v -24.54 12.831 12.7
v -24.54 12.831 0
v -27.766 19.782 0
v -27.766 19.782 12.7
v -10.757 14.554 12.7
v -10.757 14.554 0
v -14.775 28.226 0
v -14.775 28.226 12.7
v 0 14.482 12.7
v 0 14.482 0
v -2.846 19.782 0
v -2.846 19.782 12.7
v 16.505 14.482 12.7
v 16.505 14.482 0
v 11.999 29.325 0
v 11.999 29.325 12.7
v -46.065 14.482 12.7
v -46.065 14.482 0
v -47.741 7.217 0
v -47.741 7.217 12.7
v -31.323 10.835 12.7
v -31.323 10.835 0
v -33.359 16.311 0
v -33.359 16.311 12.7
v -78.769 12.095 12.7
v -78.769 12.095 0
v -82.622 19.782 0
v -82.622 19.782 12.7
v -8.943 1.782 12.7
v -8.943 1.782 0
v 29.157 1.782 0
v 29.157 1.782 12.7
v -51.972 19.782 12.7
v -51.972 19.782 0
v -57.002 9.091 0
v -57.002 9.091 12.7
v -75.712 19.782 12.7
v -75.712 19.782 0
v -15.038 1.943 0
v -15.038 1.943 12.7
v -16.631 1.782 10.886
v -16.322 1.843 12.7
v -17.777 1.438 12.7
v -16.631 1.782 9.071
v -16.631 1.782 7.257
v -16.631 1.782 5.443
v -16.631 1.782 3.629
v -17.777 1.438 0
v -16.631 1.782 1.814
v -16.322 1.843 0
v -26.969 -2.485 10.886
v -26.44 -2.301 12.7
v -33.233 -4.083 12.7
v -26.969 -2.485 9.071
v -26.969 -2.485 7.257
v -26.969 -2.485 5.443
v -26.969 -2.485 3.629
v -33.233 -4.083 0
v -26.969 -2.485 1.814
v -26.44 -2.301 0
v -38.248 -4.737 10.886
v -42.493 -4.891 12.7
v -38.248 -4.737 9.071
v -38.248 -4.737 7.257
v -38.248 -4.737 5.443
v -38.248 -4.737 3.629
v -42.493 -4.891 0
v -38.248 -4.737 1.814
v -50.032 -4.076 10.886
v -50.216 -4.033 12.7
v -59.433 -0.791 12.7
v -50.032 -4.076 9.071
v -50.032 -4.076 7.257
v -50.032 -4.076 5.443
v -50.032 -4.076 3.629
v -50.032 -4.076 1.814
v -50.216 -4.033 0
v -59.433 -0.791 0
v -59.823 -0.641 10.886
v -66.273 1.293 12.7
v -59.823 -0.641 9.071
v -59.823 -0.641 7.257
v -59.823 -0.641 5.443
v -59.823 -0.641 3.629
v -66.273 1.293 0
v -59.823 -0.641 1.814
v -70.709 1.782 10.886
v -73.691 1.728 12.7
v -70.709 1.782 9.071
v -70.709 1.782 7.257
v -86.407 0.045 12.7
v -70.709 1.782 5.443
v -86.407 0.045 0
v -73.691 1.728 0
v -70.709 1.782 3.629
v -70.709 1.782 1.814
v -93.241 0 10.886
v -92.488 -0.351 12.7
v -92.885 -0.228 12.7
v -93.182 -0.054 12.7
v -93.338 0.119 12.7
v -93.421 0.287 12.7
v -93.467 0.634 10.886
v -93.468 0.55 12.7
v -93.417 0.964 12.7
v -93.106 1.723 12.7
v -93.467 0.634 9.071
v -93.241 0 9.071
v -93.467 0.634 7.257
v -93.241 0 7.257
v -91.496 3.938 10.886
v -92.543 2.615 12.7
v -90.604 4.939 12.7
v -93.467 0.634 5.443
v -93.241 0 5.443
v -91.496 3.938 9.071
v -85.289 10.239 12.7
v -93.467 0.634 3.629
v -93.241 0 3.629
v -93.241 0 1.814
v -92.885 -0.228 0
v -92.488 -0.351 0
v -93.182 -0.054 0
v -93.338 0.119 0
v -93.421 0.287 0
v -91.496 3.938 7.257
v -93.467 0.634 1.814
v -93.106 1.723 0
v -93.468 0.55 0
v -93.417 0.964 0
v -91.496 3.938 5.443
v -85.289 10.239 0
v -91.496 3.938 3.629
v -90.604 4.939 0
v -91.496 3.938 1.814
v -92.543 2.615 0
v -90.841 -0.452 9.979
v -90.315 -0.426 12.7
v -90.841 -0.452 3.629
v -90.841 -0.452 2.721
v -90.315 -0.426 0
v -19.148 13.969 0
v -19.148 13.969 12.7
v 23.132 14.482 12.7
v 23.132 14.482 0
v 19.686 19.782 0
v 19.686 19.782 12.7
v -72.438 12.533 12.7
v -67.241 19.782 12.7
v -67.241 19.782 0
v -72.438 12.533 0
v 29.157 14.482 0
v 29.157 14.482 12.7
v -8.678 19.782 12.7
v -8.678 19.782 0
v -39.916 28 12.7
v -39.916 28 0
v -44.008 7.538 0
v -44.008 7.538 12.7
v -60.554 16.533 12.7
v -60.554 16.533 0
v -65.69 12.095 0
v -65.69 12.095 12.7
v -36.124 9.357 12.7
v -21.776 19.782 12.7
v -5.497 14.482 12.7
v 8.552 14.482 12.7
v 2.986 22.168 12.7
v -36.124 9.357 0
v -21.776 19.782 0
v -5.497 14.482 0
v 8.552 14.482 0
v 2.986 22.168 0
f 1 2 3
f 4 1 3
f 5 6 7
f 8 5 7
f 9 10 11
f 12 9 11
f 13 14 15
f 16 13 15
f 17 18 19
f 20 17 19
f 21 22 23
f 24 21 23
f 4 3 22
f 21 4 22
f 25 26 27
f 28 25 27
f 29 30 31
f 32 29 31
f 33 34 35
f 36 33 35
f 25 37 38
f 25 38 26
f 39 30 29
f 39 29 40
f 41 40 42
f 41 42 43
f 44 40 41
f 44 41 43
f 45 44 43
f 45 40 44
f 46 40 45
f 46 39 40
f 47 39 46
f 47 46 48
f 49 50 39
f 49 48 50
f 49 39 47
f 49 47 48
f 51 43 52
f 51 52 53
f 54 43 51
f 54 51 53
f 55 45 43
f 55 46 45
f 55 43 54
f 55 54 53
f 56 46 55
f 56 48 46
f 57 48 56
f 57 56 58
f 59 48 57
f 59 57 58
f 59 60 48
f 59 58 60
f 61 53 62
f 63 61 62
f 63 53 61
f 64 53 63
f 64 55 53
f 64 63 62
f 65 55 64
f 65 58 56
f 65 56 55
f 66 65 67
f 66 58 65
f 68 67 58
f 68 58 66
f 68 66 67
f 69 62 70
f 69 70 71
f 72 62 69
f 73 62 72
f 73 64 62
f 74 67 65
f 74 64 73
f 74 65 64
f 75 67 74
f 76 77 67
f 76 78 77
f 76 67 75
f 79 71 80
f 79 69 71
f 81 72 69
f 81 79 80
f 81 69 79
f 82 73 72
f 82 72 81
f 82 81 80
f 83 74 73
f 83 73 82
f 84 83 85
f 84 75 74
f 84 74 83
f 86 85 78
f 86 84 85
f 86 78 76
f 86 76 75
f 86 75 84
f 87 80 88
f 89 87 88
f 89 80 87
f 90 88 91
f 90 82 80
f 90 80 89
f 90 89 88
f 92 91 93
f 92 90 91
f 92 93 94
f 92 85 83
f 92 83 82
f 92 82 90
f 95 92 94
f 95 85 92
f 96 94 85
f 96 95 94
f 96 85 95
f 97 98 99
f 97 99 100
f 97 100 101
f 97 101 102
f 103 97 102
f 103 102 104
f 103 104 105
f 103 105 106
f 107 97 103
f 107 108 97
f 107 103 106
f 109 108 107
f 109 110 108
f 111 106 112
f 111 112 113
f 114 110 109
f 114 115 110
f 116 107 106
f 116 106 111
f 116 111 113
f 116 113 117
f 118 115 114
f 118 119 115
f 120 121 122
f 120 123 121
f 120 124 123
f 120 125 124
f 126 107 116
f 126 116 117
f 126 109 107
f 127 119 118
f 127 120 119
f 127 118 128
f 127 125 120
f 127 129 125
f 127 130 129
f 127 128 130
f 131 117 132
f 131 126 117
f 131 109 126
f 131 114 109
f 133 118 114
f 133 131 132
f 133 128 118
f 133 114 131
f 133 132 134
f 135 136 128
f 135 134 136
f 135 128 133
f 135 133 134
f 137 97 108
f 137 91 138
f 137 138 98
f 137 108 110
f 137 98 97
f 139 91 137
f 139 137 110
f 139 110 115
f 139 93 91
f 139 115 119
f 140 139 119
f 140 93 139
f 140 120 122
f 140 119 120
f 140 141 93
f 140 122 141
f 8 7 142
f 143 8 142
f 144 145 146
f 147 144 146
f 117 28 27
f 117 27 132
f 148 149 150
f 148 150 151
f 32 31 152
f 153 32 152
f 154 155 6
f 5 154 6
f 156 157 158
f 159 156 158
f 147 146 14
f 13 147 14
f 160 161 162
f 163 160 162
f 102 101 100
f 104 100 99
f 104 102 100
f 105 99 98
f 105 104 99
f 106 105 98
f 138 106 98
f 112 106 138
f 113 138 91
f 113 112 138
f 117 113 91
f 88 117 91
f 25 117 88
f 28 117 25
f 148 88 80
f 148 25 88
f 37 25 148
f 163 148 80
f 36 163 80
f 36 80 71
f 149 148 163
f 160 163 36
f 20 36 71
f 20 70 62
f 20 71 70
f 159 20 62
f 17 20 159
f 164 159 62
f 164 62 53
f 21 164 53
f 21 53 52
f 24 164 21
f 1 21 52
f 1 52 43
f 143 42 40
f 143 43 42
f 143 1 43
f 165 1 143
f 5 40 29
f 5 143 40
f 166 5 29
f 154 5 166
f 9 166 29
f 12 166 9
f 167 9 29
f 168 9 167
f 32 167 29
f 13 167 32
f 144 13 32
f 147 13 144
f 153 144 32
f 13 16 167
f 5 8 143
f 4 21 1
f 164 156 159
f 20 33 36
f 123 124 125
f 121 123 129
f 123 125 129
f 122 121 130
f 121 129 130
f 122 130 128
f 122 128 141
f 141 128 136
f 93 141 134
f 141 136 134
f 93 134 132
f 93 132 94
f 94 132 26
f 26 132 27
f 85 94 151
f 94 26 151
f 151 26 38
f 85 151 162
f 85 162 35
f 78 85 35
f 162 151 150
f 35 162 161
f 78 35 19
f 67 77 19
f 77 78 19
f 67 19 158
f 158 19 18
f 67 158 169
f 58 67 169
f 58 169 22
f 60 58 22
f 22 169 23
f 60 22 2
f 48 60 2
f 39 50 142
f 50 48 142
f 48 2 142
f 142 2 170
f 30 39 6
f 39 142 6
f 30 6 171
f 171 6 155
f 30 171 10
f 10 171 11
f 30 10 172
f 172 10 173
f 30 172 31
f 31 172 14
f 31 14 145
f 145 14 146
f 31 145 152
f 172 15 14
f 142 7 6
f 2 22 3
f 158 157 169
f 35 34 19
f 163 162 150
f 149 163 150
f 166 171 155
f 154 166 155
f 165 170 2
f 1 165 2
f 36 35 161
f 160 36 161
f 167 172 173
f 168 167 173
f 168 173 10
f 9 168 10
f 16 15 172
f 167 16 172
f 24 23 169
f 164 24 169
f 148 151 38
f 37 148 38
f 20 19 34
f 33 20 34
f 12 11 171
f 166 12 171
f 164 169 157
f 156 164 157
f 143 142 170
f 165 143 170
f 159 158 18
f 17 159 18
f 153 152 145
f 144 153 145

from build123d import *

# Parameters (mm, degrees)
F1_DEPTH = 12.7


# Not quite as in the source:
# - a feature names something its author has since deleted; it is built from what else it names


with BuildPart() as f1:
    # F0 (on Top) → F1 (new body)
    with BuildSketch(Plane.XY):
        with BuildLine():
            Line((29.1566601902, 1.7817904405), (29.1566601902, 14.4817904405))
            Line((29.1566601902, 14.4817904405), (23.1322348118, 14.4817904405))
            Line((23.1322348118, 14.4817904405), (16.5050514042, 14.4817904405))
            Line((16.5050514042, 14.4817904405), (8.552428335, 14.4817904405))
            Line((8.552428335, 14.4817904405), (0, 14.4817904405))
            Line((0, 14.4817904405), (-5.4972041398, 14.4817904405))
            Line((-5.4972041398, 14.4817904405), (-8.9433398098, 14.4817904405))
            add(Edge.make_bspline(
                [(-8.9433398098, 14.4817904405), (-10.7573023584, 14.5540929372), (-13.6536245903, 14.6695370673), (-17.5443018447, 14.2319983354), (-19.1478505954, 13.9692945078)],
                knots=[0, 0, 0, 0, 0.1219531365, 0.1947204372, 0.1947204372, 0.1947204372, 0.1947204372], degree=3))
            add(Edge.make_bspline(
                [(-19.1478505954, 13.9692945078), (-20.7855145388, 13.7010017066), (-22.5792086961, 13.3292483099), (-24.5403655562, 12.8306326712)],
                knots=[0.1947204372, 0.1947204372, 0.1947204372, 0.1947204372, 0.2690358483, 0.2690358483, 0.2690358483, 0.2690358483], degree=3))
            add(Edge.make_bspline(
                [(-24.5403655562, 12.8306326712), (-25.4054556528, 12.6106872606), (-27.5608275588, 12.0233152228), (-29.9097113738, 11.2820530364), (-31.3234997305, 10.8352217448)],
                knots=[0.2690358483, 0.2690358483, 0.2690358483, 0.2690358483, 0.3018172782, 0.3477460441, 0.3477460441, 0.3477460441, 0.3477460441], degree=3))
            add(Edge.make_bspline(
                [(-31.3234997305, 10.8352217448), (-32.8813721767, 10.3428523218), (-34.4916669077, 9.8331294404), (-36.1239915531, 9.3570380081)],
                knots=[0.3477460441, 0.3477460441, 0.3477460441, 0.3477460441, 0.3983555703, 0.3983555703, 0.3983555703, 0.3983555703], degree=3))
            add(Edge.make_bspline(
                [(-36.1239915531, 9.3570380081), (-38.7371673177, 8.5948669557), (-41.406802576, 7.9188884572), (-44.0082018162, 7.5382862352)],
                knots=[0.3983555703, 0.3983555703, 0.3983555703, 0.3983555703, 0.4793759651, 0.4793759651, 0.4793759651, 0.4793759651], degree=3))
            add(Edge.make_bspline(
                [(-44.0082018162, 7.5382862352), (-45.2733883847, 7.3531809228), (-46.5224347573, 7.2379423921), (-47.7409961664, 7.2166347961)],
                knots=[0.4793759651, 0.4793759651, 0.4793759651, 0.4793759651, 0.518780111, 0.518780111, 0.518780111, 0.518780111], degree=3))
            add(Edge.make_bspline(
                [(-47.7409961664, 7.2166347961), (-48.61023628, 7.2014353839), (-51.8736517816, 7.3260381182), (-54.8343256873, 8.2766625789), (-57.0016363215, 9.090849647)],
                knots=[0.518780111, 0.518780111, 0.518780111, 0.518780111, 0.5468883902, 0.6262253297, 0.6262253297, 0.6262253297, 0.6262253297], degree=3))
            add(Edge.make_bspline(
                [(-57.0016363215, 9.090849647), (-59.8222284032, 10.150452992), (-62.6109209229, 11.4001772385), (-65.6900354035, 12.0947333053)],
                knots=[0.6262253297, 0.6262253297, 0.6262253297, 0.6262253297, 0.7294764002, 0.7294764002, 0.7294764002, 0.7294764002], degree=3))
            add(Edge.make_bspline(
                [(-65.6900354035, 12.0947333053), (-67.0336130762, 12.397804214), (-69.2092078019, 12.7047556683), (-71.5833285763, 12.6062540598), (-72.4382368268, 12.5328440974)],
                knots=[0.7294764002, 0.7294764002, 0.7294764002, 0.7294764002, 0.7745302084, 0.7995461596, 0.7995461596, 0.7995461596, 0.7995461596], degree=3))
            add(Edge.make_bspline(
                [(-72.4382368268, 12.5328440974), (-78.4000977285, 12.0209061386), (-85.6590909795, 9.2956107983), (-85.3310582144, 10.1307918098), (-85.2885097265, 10.2391215041)],
                knots=[0.7995461596, 0.7995461596, 0.7995461596, 0.7995461596, 0.9739995247, 1, 1, 1, 1], degree=3))
            add(Edge.make_bspline(
                [(-8.9433398098, 1.7817904405), (-10.3062057468, 1.7346839959), (-12.9857258176, 1.6420683833), (-17.1466296289, 2.4827049446), (-27.1606442527, -4.0355858357), (-51.6393795509, -6.6773487114), (-67.5806364014, 5.6865791664), (-100.6765031612, -4.5794896544), (-89.9229154748, 5.7761967552), (-85.2885097265, 10.2391215041)],
                knots=[0, 0, 0, 0, 0.0795605261, 0.1564233287, 0.2898559981, 0.4816905838, 0.6666516763, 0.8563389789, 1, 1, 1, 1], degree=3))
            Line((-8.9433398098, 1.7817904405), (29.1566601902, 1.7817904405))
        make_face()
        with BuildLine():
            Line((-82.6221928, 19.7822675109), (-85.2885097265, 10.2391215041))
            add(Edge.make_bspline(
                [(-72.4382368268, 12.5328440974), (-78.4000977285, 12.0209061386), (-85.6590909795, 9.2956107983), (-85.3310582144, 10.1307918098), (-85.2885097265, 10.2391215041)],
                knots=[0.7995461596, 0.7995461596, 0.7995461596, 0.7995461596, 0.9739995247, 1, 1, 1, 1], degree=3))
            Line((-72.4382368268, 12.5328440974), (-75.7119506598, 19.7822675109))
            Line((-75.7119506598, 19.7822675109), (-78.7689969505, 12.0947333053))
            Line((-78.7689969505, 12.0947333053), (-82.6221928, 19.7822675109))
        make_face()
        with BuildLine():
            Line((-67.2413259745, 19.7822675109), (-72.4382368268, 12.5328440974))
            add(Edge.make_bspline(
                [(-65.6900354035, 12.0947333053), (-67.0336130762, 12.397804214), (-69.2092078019, 12.7047556683), (-71.5833285763, 12.6062540598), (-72.4382368268, 12.5328440974)],
                knots=[0.7294764002, 0.7294764002, 0.7294764002, 0.7294764002, 0.7745302084, 0.7995461596, 0.7995461596, 0.7995461596, 0.7995461596], degree=3))
            Line((-65.6900354035, 12.0947333053), (-67.2413259745, 19.7822675109))
        make_face()
        with BuildLine():
            Line((-51.9719198346, 19.7822675109), (-57.0016363215, 9.090849647))
            add(Edge.make_bspline(
                [(-47.7409961664, 7.2166347961), (-48.61023628, 7.2014353839), (-51.8736517816, 7.3260381182), (-54.8343256873, 8.2766625789), (-57.0016363215, 9.090849647)],
                knots=[0.518780111, 0.518780111, 0.518780111, 0.518780111, 0.5468883902, 0.6262253297, 0.6262253297, 0.6262253297, 0.6262253297], degree=3))
            Line((-47.7409961664, 7.2166347961), (-51.9719198346, 19.7822675109))
        make_face()
        with BuildLine():
            Line((-46.0647791624, 14.4817904405), (-47.7409961664, 7.2166347961))
            add(Edge.make_bspline(
                [(-44.0082018162, 7.5382862352), (-45.2733883847, 7.3531809228), (-46.5224347573, 7.2379423921), (-47.7409961664, 7.2166347961)],
                knots=[0.4793759651, 0.4793759651, 0.4793759651, 0.4793759651, 0.518780111, 0.518780111, 0.518780111, 0.518780111], degree=3))
            Line((-44.0082018162, 7.5382862352), (-46.0647791624, 14.4817904405))
        make_face()
        with BuildLine():
            Line((-39.9164316104, 27.9997758427), (-44.0082018162, 7.5382862352))
            add(Edge.make_bspline(
                [(-36.1239915531, 9.3570380081), (-38.7371673177, 8.5948669557), (-41.406802576, 7.9188884572), (-44.0082018162, 7.5382862352)],
                knots=[0.3983555703, 0.3983555703, 0.3983555703, 0.3983555703, 0.4793759651, 0.4793759651, 0.4793759651, 0.4793759651], degree=3))
            Line((-36.1239915531, 9.3570380081), (-39.9164316104, 27.9997758427))
        make_face()
        with BuildLine():
            Line((-33.3588495851, 16.3105223328), (-36.1239915531, 9.3570380081))
            add(Edge.make_bspline(
                [(-31.3234997305, 10.8352217448), (-32.8813721767, 10.3428523218), (-34.4916669077, 9.8331294404), (-36.1239915531, 9.3570380081)],
                knots=[0.3477460441, 0.3477460441, 0.3477460441, 0.3477460441, 0.3983555703, 0.3983555703, 0.3983555703, 0.3983555703], degree=3))
            Line((-31.3234997305, 10.8352217448), (-33.3588495851, 16.3105223328))
        make_face()
        with BuildLine():
            add(Edge.make_bspline(
                [(-24.5403655562, 12.8306326712), (-25.4054556528, 12.6106872606), (-27.5608275588, 12.0233152228), (-29.9097113738, 11.2820530364), (-31.3234997305, 10.8352217448)],
                knots=[0.2690358483, 0.2690358483, 0.2690358483, 0.2690358483, 0.3018172782, 0.3477460441, 0.3477460441, 0.3477460441, 0.3477460441], degree=3))
            Line((-24.5403655562, 12.8306326712), (-27.7655925602, 19.7822675109))
            Line((-27.7655925602, 19.7822675109), (-31.3234997305, 10.8352217448))
        make_face()
        with BuildLine():
            add(Edge.make_bspline(
                [(-19.1478505954, 13.9692945078), (-20.7855145388, 13.7010017066), (-22.5792086961, 13.3292483099), (-24.5403655562, 12.8306326712)],
                knots=[0.1947204372, 0.1947204372, 0.1947204372, 0.1947204372, 0.2690358483, 0.2690358483, 0.2690358483, 0.2690358483], degree=3))
            Line((-19.1478505954, 13.9692945078), (-21.7759590596, 19.7822675109))
            Line((-21.7759590596, 19.7822675109), (-24.5403655562, 12.8306326712))
        make_face()
        Polygon((-5.4972041398, 14.4817904405), (0, 14.4817904405), (-2.846329473, 19.7822675109), align=None)
        Polygon((0, 14.4817904405), (8.552428335, 14.4817904405), (2.9855933972, 22.1680551767), align=None)
        Polygon((8.552428335, 14.4817904405), (16.5050514042, 14.4817904405), (11.9985649362, 29.325414449), align=None)
        Polygon((16.5050514042, 14.4817904405), (23.1322348118, 14.4817904405), (19.6860991418, 19.7822675109), align=None)
        with BuildLine():
            Line((-8.9433398098, 14.4817904405), (-5.4972041398, 14.4817904405))
            Line((-5.4972041398, 14.4817904405), (-8.6782518774, 19.7822675109))
            Line((-8.6782518774, 19.7822675109), (-10.7573023584, 14.5540929372))
            Line((-10.7573023584, 14.5540929372), (-14.7752631456, 28.2258577645))
            Line((-14.7752631456, 28.2258577645), (-19.1478505954, 13.9692945078))
            add(Edge.make_bspline(
                [(-8.9433398098, 14.4817904405), (-10.7573023584, 14.5540929372), (-13.6536245903, 14.6695370673), (-17.5443018447, 14.2319983354), (-19.1478505954, 13.9692945078)],
                knots=[0, 0, 0, 0, 0.1219531365, 0.1947204372, 0.1947204372, 0.1947204372, 0.1947204372], degree=3))
        make_face()
        with BuildLine():
            Line((-60.5539940298, 16.5334325284), (-65.6900354035, 12.0947333053))
            add(Edge.make_bspline(
                [(-57.0016363215, 9.090849647), (-59.8222284032, 10.150452992), (-62.6109209229, 11.4001772385), (-65.6900354035, 12.0947333053)],
                knots=[0.6262253297, 0.6262253297, 0.6262253297, 0.6262253297, 0.7294764002, 0.7294764002, 0.7294764002, 0.7294764002], degree=3))
            Line((-57.0016363215, 9.090849647), (-60.5539940298, 16.5334325284))
        make_face()
    extrude(amount=F1_DEPTH)


solid = f1.part
